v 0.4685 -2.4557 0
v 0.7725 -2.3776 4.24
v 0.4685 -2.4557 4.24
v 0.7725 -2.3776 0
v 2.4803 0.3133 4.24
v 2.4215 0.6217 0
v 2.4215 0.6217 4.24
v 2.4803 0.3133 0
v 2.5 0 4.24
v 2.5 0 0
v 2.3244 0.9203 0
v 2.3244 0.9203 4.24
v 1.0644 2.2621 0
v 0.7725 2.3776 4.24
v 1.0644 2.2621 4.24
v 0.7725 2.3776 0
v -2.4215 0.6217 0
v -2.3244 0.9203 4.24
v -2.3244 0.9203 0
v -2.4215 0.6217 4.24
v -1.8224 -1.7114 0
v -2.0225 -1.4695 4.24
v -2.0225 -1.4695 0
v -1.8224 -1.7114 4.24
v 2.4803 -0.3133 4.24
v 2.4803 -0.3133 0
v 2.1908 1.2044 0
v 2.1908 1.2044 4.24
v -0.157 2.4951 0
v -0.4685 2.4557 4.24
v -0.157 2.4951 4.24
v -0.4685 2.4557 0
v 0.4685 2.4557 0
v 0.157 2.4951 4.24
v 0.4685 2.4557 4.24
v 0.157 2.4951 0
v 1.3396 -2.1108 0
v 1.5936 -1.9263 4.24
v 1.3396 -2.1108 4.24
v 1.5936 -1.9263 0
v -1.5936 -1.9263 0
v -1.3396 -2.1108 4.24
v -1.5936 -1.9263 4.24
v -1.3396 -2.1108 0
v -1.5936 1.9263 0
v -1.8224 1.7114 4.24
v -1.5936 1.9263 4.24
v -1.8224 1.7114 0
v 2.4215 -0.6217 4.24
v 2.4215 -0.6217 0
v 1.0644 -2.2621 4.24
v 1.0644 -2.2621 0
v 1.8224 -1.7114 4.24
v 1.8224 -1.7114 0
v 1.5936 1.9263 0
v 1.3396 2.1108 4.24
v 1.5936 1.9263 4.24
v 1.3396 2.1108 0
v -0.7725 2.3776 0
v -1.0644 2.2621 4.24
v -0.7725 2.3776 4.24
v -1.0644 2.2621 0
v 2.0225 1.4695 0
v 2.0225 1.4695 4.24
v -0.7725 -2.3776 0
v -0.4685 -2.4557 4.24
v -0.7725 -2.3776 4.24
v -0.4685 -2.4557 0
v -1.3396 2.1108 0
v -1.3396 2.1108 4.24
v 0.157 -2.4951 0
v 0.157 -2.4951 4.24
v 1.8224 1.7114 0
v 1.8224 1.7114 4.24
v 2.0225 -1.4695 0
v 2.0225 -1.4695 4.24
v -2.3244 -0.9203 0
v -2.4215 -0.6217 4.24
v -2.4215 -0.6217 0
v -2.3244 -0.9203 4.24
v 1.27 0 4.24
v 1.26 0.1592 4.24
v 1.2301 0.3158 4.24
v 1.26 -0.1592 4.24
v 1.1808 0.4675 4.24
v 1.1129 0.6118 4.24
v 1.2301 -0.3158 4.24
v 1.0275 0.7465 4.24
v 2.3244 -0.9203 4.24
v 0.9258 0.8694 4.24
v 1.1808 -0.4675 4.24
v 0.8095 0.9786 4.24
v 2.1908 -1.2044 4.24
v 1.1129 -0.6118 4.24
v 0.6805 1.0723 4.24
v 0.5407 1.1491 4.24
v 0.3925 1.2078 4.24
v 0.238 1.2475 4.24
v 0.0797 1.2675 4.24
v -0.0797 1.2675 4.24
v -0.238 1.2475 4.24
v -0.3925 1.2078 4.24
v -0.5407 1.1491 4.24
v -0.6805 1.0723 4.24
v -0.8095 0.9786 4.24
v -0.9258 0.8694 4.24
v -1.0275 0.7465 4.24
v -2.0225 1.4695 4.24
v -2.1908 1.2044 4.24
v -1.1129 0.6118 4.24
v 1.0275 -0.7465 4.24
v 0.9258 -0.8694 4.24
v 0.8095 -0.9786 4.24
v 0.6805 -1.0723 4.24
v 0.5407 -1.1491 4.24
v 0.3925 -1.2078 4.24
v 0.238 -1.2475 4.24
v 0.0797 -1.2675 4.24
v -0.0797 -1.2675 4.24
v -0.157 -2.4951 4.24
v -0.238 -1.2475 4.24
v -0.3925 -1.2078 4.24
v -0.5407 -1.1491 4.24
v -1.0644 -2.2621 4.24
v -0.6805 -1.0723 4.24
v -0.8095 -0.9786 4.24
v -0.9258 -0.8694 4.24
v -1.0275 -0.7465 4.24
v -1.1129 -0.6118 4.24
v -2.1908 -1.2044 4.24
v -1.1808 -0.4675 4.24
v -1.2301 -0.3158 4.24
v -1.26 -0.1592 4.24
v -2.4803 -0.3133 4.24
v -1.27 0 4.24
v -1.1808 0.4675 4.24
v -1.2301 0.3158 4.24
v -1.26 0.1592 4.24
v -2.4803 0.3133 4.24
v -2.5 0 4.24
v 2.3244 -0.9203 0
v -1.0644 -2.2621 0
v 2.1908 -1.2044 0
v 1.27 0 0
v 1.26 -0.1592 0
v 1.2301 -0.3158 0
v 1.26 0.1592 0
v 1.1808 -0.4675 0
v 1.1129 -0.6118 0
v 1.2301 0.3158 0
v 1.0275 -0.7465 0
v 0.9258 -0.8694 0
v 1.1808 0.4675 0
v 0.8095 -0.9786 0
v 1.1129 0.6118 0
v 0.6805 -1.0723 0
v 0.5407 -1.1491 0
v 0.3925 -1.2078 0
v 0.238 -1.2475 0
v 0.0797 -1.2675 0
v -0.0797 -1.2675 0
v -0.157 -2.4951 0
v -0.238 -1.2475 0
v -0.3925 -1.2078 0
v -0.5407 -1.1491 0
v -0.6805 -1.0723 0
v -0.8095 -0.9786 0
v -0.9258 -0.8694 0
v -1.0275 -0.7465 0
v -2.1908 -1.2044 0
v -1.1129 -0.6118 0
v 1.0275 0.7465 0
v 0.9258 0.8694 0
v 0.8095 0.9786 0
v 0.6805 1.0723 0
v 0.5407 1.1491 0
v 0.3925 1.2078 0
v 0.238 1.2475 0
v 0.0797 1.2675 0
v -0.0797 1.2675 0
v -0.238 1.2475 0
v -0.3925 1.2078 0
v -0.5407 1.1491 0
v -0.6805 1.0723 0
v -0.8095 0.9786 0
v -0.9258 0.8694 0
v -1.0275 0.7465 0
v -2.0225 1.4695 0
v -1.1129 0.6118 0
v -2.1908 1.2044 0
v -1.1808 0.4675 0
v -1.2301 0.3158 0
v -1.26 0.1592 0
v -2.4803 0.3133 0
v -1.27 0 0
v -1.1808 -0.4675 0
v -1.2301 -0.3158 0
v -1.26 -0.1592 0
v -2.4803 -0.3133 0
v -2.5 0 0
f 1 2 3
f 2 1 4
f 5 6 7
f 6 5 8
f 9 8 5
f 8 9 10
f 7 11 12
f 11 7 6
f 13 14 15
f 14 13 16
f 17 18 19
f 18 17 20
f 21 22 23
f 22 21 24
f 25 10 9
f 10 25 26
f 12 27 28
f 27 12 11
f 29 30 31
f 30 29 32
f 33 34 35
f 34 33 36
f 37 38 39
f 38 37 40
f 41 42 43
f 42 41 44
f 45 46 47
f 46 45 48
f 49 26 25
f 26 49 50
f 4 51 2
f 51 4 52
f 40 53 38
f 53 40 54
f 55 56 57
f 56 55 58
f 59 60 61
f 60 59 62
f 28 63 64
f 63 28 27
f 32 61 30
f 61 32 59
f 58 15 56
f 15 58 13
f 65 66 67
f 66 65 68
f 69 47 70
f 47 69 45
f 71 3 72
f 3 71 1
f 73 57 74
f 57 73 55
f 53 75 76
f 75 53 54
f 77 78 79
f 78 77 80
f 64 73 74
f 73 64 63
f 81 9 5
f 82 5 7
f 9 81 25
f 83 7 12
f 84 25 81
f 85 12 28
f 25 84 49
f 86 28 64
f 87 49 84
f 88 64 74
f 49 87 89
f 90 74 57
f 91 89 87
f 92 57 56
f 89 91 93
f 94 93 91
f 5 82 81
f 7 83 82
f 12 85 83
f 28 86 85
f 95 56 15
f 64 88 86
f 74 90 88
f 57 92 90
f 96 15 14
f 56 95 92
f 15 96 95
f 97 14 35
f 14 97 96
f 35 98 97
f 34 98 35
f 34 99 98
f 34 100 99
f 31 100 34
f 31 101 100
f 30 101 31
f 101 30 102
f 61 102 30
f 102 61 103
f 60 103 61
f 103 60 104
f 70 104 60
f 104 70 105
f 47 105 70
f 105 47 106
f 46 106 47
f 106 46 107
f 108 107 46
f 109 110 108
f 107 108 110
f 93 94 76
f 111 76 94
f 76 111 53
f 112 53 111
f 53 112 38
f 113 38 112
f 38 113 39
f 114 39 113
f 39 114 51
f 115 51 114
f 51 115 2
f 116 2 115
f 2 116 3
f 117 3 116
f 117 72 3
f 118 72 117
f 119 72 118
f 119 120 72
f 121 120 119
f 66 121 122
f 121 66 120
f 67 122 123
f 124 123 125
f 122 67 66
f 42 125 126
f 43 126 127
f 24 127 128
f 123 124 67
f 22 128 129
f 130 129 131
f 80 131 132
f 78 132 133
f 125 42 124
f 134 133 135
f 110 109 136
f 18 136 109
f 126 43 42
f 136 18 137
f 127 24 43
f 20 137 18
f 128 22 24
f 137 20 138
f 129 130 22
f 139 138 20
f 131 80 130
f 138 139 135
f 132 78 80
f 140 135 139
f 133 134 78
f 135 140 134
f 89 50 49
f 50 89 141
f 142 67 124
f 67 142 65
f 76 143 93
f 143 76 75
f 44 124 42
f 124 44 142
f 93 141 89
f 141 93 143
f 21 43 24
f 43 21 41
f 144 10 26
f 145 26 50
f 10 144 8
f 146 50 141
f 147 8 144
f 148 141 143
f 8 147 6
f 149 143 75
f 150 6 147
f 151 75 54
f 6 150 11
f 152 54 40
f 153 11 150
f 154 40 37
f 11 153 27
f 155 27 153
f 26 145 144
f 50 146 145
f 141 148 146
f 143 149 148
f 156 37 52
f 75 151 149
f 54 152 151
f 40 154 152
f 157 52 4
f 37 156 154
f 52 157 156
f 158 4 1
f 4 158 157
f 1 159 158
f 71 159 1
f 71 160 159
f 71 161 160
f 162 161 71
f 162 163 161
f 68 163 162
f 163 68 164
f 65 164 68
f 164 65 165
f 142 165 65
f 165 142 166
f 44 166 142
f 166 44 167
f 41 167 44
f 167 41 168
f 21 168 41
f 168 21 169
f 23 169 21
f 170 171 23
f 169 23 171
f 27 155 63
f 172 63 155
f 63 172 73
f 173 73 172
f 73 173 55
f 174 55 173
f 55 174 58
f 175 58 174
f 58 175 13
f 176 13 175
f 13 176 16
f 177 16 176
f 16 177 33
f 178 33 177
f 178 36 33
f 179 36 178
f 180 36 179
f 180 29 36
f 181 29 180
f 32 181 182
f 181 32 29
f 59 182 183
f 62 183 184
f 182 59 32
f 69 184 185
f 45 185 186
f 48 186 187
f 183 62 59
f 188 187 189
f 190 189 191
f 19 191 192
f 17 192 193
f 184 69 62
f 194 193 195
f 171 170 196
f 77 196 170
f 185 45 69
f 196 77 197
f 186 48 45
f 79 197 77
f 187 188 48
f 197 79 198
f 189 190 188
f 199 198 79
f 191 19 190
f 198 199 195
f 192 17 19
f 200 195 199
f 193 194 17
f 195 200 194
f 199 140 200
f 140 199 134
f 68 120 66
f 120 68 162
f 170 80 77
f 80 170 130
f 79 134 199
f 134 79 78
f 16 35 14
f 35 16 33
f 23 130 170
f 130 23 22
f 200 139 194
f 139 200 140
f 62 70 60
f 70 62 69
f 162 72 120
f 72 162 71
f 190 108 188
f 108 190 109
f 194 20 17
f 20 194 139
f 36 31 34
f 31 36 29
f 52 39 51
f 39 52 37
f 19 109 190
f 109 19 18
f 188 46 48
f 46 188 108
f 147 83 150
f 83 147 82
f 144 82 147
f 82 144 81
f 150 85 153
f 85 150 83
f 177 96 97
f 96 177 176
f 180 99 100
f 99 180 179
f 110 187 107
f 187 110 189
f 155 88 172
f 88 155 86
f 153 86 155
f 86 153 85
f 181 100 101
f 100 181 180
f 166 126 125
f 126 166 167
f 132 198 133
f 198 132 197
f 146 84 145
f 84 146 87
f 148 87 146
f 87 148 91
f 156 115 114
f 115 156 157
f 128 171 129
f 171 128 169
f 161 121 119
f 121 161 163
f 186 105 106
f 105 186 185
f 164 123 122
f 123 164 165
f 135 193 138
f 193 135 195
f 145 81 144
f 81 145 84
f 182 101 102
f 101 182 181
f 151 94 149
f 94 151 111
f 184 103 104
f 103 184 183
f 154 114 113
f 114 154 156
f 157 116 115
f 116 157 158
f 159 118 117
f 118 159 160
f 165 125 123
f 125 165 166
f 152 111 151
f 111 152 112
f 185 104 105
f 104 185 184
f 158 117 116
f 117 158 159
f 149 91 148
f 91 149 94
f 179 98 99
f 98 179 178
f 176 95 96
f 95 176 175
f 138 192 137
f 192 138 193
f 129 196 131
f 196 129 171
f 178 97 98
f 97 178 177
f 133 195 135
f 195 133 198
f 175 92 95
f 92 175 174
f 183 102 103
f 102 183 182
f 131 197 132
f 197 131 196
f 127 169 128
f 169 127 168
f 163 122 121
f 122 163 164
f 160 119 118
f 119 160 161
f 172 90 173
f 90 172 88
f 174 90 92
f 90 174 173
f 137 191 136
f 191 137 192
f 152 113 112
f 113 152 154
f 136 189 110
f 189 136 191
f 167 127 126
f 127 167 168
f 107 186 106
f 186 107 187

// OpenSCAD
// file: board_config.scad
rail_position=20;
rail_height=2.5;
rail_width=5;
mainboard_width=60;
mainboard_height=130;
mainboard_thickness=4;
mainboard_spacing=10;
deep_holes_spacing=10;
rails=4;


board_attacher_width=4;
board_attacher_height=55;
board_attacher_length=30;

side_panel_height = board_attacher_height + 2*mainboard_thickness;
side_panel_thickness=2;
side_panel_ticks=2;

front_panel_height = board_attacher_height + 2*mainboard_thickness;
front_panel_thickness=2;
front_panel_ticks=2;
front_panel_width = mainboard_height + 2*side_panel_thickness;
// file: dovetail.scad
module dovetail_shape(width, height, length) {
    translate([-width/2,0,0]) linear_extrude(height = length) {
        polygon([[0, 0], [width, 0], [width - width/3, height], [width/3, height]]);
    }
}

module rail(male=false, width, height, length, default_offset=0.2) {
    // male will reduce the width slightly
    offset = male ? default_offset : 0;
    
    translate([0,0,-height+offset]) rotate([90,0,0]) dovetail_shape(width-2*offset,height-offset,length);
}
// file: midiport_ada.scad
module midiport_ada() {
    // origin point is bottom left looking at plate and connectors at the bottom
    // This is a bounding box, the connectors on the back are included in the shape
    plate_width = 20;
    plate_height = 20;
    plate_depth = 2.33;
               
    plate_side_width = 1;
    plug_cut = 13.7;
        
    module plate(width, height, depth, side_width, plug_cut) {
        side_depth = 1.3;
        base_height = 7;
        base_depth = 12.76;
        margin=0.1;
        
        translate([-width/2,-height/2,0]) difference() {
            union() {
                cube([width, height, depth]); // plate
                translate([side_width,0,depth]) cube([width-side_width*2, base_height, base_depth]); // base
            }
            translate([width/2,height/2,-margin/2]) cylinder(h=depth+margin, d=plug_cut);
            translate([-margin/2,-margin/2,depth-side_depth-margin/2]) cube([side_width+margin, height+margin, side_depth+margin]); 
            translate([-margin/2+width-side_width,-margin/2,depth-side_depth-margin/2]) cube([side_width+margin, height+margin, side_depth+margin]); 
        }
    }
    module plug(plug_cut, plate_depth) {
        connectors_safety_zone = 2;
        depth = 9.5 + plate_depth; 
        diameter = 11.7;
        cylinder(depth+connectors_safety_zone, d= diameter);
        translate([0,0,plate_depth]) cylinder(depth+connectors_safety_zone, d=plug_cut);
    }
    color("grey") translate([plate_width/2,0,plate_height/2]) rotate([90,0,180])  union() {
        plate(plate_width,plate_height, plate_depth, plate_side_width,plug_cut);
        translate([0,0,0]) plug(plug_cut,plate_depth);
    }
}
// file: generic_board.scad
include <dovetail.scad>;
include <board_config.scad>;
include <common.scad>;


hole_spacing=10;
front_back_holes_depth=10;

module generic_board_attacher_mating() {
    difference() {
        cube([board_attacher_width,board_attacher_length,board_attacher_height]);
        // non attaching holes
        
        for (z=[1:board_attacher_height/(hole_spacing/2)-1]) translate([0,0,hole_spacing/2*z]) union() {
            /*for (i=[1:board_attacher_length/hole_spacing-1]) 
                translate([-margin,hole_spacing*i,0]) rotate([0,90,0]) 
                    cylinder(board_attacher_width+2*margin,d=bigscrew_diameter, $fn=50);*/
            for (i=[1:board_attacher_length/(hole_spacing/2)]) 
                translate([-margin,hole_spacing*i/2-hole_spacing/4,0]) rotate([0,90,0]) 
                    cylinder(board_attacher_width+2*margin,d=bigscrew_attach_hole_diameter, $fn=50);                
        }
        // vertical attaching holes
        for (i=[1:board_attacher_height/(hole_spacing/2)-1]) 
            union() {
                translate([board_attacher_width/2,front_back_holes_depth+margin,hole_spacing*i/2]) rotate([90,00,0]) 
                    cylinder(front_back_holes_depth+2*margin,d=bigscrew_attach_hole_diameter, $fn=50);             
                translate([board_attacher_width/2,board_attacher_length+margin,hole_spacing*i/2]) rotate([90,00,0]) 
                    cylinder(front_back_holes_depth+2*margin,d=bigscrew_attach_hole_diameter, $fn=50);             
            }
                
    }
}

module generic_board_attacher() {
    union() {
        generic_board_attacher_mating();
        translate([board_attacher_width/2,board_attacher_length,0]) rail(true, rail_width, rail_height, board_attacher_length);  
        translate([board_attacher_width/2,board_attacher_length,board_attacher_height]) rotate([0,180,0]) rail(true, rail_width, rail_height, board_attacher_length);  
    }
}

//generic_board_attacher();
// file: midiboard_ada_config.scad
include <common.scad>;
midi_board_width = 2*inch_to_mm;
midi_board_height = 0.9*inch_to_mm;
midi_board_depth = 1.62;
midi_board_hole_diameter = 2.54;
midi_board_hole_from_side = 0.05*inch_to_mm + midi_board_hole_diameter/2;
midi_board_underclearance = 4.24; // For the optocoupler
midi_support_board_height=1;
midi_support_thickness=4;
midi_support_spacing=midi_board_underclearance;


midi_board_holes = [
   [midi_board_hole_from_side, midi_board_hole_from_side],
   [midi_board_width-midi_board_hole_from_side, midi_board_hole_from_side],
   [midi_board_hole_from_side, midi_board_height-midi_board_hole_from_side],
   [midi_board_width-midi_board_hole_from_side, midi_board_height-midi_board_hole_from_side]
];
// file: midiboard_ada.scad
include <common.scad>
include <midiport_ada.scad>
include <midiboard_ada_config.scad>

module midiboard_ada() {
    // Midi featherwing
    $fn=50;
    port_retreat = 3.2;
    port_left = 5;
    port_right = 26;
    
    width_hole_space = 45;
    height_hole_space = 17.5;
    safety_area = 5;
    margin=0.1;
    translate([0,0,midi_board_underclearance]) union() {
        translate([port_left, port_retreat, midi_board_depth]) midiport_ada(); // out
        translate([port_right, port_retreat, midi_board_depth]) midiport_ada(); // in
        color("green") difference() {
            cube([midi_board_width, midi_board_height, midi_board_depth]);
            for (i=[0:3]) translate([midi_board_holes[i][0], midi_board_holes[i][1], -margin/2])  cylinder(h=midi_board_depth+margin,d=midi_board_hole_diameter);
            
        }
        // safety zone
        color("red") union() {
            translate([safety_area,0,-midi_board_underclearance]) cube([midi_board_width-safety_area*2, midi_board_height, midi_board_underclearance]);
            translate([0,safety_area,-midi_board_underclearance]) cube([midi_board_width, midi_board_height-safety_area*2, midi_board_underclearance]);
        }
    }
}

midiboard_ada();
// file: common.scad
inch_to_mm = 25.4;

margin=0.1;
bigscrew_attach_hole_diameter= 2.44;
bigscrew_diameter = 2.54;
bigscrew_head_diameter = 5;
bigscrew_head_height = 2.1;
// main file
include <common.scad>
use <midiboard_ada.scad>
include <midiboard_ada_config.scad>
include <generic_board.scad>

module midiboard_spacer() {
    $fn=50;
    difference() {
        cylinder(midi_support_spacing, d=bigscrew_head_diameter);
        translate([0,0,-margin/2]) cylinder(midi_support_spacing+margin, d=bigscrew_diameter);
    }
}

midiboard_spacer();
